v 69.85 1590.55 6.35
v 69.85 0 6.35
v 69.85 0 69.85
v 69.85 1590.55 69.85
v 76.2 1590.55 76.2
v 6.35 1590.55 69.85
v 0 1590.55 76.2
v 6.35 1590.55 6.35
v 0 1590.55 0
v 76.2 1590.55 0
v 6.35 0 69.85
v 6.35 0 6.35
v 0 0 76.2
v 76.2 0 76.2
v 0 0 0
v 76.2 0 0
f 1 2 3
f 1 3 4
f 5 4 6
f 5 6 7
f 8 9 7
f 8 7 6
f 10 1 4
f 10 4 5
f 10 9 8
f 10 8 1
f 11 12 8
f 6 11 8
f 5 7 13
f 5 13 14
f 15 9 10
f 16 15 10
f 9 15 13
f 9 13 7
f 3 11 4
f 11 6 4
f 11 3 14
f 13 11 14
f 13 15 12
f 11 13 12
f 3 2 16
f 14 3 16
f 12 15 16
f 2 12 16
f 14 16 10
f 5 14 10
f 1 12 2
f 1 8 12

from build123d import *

# Parameters (mm, degrees)
BOX_W       = 76.2
BOX_H       = 1590.55
BOX_DEPTH   = 76.2
THICKNESS_T = -6.35


with BuildPart() as part:
    # Box → Box (new body)
    with BuildSketch(Plane.XY):
        with Locations((38.1, 795.275)):
            Rectangle(BOX_W, BOX_H)
    extrude(amount=BOX_DEPTH)

    # Thickness
    thickness_openings = [part.faces().sort_by_distance(p)[0] for p in [
        (38.1, 0, 38.1),
        (38.1, 1590.55, 38.1),
    ]]
    offset(amount=THICKNESS_T, openings=thickness_openings)


solid = part.part
